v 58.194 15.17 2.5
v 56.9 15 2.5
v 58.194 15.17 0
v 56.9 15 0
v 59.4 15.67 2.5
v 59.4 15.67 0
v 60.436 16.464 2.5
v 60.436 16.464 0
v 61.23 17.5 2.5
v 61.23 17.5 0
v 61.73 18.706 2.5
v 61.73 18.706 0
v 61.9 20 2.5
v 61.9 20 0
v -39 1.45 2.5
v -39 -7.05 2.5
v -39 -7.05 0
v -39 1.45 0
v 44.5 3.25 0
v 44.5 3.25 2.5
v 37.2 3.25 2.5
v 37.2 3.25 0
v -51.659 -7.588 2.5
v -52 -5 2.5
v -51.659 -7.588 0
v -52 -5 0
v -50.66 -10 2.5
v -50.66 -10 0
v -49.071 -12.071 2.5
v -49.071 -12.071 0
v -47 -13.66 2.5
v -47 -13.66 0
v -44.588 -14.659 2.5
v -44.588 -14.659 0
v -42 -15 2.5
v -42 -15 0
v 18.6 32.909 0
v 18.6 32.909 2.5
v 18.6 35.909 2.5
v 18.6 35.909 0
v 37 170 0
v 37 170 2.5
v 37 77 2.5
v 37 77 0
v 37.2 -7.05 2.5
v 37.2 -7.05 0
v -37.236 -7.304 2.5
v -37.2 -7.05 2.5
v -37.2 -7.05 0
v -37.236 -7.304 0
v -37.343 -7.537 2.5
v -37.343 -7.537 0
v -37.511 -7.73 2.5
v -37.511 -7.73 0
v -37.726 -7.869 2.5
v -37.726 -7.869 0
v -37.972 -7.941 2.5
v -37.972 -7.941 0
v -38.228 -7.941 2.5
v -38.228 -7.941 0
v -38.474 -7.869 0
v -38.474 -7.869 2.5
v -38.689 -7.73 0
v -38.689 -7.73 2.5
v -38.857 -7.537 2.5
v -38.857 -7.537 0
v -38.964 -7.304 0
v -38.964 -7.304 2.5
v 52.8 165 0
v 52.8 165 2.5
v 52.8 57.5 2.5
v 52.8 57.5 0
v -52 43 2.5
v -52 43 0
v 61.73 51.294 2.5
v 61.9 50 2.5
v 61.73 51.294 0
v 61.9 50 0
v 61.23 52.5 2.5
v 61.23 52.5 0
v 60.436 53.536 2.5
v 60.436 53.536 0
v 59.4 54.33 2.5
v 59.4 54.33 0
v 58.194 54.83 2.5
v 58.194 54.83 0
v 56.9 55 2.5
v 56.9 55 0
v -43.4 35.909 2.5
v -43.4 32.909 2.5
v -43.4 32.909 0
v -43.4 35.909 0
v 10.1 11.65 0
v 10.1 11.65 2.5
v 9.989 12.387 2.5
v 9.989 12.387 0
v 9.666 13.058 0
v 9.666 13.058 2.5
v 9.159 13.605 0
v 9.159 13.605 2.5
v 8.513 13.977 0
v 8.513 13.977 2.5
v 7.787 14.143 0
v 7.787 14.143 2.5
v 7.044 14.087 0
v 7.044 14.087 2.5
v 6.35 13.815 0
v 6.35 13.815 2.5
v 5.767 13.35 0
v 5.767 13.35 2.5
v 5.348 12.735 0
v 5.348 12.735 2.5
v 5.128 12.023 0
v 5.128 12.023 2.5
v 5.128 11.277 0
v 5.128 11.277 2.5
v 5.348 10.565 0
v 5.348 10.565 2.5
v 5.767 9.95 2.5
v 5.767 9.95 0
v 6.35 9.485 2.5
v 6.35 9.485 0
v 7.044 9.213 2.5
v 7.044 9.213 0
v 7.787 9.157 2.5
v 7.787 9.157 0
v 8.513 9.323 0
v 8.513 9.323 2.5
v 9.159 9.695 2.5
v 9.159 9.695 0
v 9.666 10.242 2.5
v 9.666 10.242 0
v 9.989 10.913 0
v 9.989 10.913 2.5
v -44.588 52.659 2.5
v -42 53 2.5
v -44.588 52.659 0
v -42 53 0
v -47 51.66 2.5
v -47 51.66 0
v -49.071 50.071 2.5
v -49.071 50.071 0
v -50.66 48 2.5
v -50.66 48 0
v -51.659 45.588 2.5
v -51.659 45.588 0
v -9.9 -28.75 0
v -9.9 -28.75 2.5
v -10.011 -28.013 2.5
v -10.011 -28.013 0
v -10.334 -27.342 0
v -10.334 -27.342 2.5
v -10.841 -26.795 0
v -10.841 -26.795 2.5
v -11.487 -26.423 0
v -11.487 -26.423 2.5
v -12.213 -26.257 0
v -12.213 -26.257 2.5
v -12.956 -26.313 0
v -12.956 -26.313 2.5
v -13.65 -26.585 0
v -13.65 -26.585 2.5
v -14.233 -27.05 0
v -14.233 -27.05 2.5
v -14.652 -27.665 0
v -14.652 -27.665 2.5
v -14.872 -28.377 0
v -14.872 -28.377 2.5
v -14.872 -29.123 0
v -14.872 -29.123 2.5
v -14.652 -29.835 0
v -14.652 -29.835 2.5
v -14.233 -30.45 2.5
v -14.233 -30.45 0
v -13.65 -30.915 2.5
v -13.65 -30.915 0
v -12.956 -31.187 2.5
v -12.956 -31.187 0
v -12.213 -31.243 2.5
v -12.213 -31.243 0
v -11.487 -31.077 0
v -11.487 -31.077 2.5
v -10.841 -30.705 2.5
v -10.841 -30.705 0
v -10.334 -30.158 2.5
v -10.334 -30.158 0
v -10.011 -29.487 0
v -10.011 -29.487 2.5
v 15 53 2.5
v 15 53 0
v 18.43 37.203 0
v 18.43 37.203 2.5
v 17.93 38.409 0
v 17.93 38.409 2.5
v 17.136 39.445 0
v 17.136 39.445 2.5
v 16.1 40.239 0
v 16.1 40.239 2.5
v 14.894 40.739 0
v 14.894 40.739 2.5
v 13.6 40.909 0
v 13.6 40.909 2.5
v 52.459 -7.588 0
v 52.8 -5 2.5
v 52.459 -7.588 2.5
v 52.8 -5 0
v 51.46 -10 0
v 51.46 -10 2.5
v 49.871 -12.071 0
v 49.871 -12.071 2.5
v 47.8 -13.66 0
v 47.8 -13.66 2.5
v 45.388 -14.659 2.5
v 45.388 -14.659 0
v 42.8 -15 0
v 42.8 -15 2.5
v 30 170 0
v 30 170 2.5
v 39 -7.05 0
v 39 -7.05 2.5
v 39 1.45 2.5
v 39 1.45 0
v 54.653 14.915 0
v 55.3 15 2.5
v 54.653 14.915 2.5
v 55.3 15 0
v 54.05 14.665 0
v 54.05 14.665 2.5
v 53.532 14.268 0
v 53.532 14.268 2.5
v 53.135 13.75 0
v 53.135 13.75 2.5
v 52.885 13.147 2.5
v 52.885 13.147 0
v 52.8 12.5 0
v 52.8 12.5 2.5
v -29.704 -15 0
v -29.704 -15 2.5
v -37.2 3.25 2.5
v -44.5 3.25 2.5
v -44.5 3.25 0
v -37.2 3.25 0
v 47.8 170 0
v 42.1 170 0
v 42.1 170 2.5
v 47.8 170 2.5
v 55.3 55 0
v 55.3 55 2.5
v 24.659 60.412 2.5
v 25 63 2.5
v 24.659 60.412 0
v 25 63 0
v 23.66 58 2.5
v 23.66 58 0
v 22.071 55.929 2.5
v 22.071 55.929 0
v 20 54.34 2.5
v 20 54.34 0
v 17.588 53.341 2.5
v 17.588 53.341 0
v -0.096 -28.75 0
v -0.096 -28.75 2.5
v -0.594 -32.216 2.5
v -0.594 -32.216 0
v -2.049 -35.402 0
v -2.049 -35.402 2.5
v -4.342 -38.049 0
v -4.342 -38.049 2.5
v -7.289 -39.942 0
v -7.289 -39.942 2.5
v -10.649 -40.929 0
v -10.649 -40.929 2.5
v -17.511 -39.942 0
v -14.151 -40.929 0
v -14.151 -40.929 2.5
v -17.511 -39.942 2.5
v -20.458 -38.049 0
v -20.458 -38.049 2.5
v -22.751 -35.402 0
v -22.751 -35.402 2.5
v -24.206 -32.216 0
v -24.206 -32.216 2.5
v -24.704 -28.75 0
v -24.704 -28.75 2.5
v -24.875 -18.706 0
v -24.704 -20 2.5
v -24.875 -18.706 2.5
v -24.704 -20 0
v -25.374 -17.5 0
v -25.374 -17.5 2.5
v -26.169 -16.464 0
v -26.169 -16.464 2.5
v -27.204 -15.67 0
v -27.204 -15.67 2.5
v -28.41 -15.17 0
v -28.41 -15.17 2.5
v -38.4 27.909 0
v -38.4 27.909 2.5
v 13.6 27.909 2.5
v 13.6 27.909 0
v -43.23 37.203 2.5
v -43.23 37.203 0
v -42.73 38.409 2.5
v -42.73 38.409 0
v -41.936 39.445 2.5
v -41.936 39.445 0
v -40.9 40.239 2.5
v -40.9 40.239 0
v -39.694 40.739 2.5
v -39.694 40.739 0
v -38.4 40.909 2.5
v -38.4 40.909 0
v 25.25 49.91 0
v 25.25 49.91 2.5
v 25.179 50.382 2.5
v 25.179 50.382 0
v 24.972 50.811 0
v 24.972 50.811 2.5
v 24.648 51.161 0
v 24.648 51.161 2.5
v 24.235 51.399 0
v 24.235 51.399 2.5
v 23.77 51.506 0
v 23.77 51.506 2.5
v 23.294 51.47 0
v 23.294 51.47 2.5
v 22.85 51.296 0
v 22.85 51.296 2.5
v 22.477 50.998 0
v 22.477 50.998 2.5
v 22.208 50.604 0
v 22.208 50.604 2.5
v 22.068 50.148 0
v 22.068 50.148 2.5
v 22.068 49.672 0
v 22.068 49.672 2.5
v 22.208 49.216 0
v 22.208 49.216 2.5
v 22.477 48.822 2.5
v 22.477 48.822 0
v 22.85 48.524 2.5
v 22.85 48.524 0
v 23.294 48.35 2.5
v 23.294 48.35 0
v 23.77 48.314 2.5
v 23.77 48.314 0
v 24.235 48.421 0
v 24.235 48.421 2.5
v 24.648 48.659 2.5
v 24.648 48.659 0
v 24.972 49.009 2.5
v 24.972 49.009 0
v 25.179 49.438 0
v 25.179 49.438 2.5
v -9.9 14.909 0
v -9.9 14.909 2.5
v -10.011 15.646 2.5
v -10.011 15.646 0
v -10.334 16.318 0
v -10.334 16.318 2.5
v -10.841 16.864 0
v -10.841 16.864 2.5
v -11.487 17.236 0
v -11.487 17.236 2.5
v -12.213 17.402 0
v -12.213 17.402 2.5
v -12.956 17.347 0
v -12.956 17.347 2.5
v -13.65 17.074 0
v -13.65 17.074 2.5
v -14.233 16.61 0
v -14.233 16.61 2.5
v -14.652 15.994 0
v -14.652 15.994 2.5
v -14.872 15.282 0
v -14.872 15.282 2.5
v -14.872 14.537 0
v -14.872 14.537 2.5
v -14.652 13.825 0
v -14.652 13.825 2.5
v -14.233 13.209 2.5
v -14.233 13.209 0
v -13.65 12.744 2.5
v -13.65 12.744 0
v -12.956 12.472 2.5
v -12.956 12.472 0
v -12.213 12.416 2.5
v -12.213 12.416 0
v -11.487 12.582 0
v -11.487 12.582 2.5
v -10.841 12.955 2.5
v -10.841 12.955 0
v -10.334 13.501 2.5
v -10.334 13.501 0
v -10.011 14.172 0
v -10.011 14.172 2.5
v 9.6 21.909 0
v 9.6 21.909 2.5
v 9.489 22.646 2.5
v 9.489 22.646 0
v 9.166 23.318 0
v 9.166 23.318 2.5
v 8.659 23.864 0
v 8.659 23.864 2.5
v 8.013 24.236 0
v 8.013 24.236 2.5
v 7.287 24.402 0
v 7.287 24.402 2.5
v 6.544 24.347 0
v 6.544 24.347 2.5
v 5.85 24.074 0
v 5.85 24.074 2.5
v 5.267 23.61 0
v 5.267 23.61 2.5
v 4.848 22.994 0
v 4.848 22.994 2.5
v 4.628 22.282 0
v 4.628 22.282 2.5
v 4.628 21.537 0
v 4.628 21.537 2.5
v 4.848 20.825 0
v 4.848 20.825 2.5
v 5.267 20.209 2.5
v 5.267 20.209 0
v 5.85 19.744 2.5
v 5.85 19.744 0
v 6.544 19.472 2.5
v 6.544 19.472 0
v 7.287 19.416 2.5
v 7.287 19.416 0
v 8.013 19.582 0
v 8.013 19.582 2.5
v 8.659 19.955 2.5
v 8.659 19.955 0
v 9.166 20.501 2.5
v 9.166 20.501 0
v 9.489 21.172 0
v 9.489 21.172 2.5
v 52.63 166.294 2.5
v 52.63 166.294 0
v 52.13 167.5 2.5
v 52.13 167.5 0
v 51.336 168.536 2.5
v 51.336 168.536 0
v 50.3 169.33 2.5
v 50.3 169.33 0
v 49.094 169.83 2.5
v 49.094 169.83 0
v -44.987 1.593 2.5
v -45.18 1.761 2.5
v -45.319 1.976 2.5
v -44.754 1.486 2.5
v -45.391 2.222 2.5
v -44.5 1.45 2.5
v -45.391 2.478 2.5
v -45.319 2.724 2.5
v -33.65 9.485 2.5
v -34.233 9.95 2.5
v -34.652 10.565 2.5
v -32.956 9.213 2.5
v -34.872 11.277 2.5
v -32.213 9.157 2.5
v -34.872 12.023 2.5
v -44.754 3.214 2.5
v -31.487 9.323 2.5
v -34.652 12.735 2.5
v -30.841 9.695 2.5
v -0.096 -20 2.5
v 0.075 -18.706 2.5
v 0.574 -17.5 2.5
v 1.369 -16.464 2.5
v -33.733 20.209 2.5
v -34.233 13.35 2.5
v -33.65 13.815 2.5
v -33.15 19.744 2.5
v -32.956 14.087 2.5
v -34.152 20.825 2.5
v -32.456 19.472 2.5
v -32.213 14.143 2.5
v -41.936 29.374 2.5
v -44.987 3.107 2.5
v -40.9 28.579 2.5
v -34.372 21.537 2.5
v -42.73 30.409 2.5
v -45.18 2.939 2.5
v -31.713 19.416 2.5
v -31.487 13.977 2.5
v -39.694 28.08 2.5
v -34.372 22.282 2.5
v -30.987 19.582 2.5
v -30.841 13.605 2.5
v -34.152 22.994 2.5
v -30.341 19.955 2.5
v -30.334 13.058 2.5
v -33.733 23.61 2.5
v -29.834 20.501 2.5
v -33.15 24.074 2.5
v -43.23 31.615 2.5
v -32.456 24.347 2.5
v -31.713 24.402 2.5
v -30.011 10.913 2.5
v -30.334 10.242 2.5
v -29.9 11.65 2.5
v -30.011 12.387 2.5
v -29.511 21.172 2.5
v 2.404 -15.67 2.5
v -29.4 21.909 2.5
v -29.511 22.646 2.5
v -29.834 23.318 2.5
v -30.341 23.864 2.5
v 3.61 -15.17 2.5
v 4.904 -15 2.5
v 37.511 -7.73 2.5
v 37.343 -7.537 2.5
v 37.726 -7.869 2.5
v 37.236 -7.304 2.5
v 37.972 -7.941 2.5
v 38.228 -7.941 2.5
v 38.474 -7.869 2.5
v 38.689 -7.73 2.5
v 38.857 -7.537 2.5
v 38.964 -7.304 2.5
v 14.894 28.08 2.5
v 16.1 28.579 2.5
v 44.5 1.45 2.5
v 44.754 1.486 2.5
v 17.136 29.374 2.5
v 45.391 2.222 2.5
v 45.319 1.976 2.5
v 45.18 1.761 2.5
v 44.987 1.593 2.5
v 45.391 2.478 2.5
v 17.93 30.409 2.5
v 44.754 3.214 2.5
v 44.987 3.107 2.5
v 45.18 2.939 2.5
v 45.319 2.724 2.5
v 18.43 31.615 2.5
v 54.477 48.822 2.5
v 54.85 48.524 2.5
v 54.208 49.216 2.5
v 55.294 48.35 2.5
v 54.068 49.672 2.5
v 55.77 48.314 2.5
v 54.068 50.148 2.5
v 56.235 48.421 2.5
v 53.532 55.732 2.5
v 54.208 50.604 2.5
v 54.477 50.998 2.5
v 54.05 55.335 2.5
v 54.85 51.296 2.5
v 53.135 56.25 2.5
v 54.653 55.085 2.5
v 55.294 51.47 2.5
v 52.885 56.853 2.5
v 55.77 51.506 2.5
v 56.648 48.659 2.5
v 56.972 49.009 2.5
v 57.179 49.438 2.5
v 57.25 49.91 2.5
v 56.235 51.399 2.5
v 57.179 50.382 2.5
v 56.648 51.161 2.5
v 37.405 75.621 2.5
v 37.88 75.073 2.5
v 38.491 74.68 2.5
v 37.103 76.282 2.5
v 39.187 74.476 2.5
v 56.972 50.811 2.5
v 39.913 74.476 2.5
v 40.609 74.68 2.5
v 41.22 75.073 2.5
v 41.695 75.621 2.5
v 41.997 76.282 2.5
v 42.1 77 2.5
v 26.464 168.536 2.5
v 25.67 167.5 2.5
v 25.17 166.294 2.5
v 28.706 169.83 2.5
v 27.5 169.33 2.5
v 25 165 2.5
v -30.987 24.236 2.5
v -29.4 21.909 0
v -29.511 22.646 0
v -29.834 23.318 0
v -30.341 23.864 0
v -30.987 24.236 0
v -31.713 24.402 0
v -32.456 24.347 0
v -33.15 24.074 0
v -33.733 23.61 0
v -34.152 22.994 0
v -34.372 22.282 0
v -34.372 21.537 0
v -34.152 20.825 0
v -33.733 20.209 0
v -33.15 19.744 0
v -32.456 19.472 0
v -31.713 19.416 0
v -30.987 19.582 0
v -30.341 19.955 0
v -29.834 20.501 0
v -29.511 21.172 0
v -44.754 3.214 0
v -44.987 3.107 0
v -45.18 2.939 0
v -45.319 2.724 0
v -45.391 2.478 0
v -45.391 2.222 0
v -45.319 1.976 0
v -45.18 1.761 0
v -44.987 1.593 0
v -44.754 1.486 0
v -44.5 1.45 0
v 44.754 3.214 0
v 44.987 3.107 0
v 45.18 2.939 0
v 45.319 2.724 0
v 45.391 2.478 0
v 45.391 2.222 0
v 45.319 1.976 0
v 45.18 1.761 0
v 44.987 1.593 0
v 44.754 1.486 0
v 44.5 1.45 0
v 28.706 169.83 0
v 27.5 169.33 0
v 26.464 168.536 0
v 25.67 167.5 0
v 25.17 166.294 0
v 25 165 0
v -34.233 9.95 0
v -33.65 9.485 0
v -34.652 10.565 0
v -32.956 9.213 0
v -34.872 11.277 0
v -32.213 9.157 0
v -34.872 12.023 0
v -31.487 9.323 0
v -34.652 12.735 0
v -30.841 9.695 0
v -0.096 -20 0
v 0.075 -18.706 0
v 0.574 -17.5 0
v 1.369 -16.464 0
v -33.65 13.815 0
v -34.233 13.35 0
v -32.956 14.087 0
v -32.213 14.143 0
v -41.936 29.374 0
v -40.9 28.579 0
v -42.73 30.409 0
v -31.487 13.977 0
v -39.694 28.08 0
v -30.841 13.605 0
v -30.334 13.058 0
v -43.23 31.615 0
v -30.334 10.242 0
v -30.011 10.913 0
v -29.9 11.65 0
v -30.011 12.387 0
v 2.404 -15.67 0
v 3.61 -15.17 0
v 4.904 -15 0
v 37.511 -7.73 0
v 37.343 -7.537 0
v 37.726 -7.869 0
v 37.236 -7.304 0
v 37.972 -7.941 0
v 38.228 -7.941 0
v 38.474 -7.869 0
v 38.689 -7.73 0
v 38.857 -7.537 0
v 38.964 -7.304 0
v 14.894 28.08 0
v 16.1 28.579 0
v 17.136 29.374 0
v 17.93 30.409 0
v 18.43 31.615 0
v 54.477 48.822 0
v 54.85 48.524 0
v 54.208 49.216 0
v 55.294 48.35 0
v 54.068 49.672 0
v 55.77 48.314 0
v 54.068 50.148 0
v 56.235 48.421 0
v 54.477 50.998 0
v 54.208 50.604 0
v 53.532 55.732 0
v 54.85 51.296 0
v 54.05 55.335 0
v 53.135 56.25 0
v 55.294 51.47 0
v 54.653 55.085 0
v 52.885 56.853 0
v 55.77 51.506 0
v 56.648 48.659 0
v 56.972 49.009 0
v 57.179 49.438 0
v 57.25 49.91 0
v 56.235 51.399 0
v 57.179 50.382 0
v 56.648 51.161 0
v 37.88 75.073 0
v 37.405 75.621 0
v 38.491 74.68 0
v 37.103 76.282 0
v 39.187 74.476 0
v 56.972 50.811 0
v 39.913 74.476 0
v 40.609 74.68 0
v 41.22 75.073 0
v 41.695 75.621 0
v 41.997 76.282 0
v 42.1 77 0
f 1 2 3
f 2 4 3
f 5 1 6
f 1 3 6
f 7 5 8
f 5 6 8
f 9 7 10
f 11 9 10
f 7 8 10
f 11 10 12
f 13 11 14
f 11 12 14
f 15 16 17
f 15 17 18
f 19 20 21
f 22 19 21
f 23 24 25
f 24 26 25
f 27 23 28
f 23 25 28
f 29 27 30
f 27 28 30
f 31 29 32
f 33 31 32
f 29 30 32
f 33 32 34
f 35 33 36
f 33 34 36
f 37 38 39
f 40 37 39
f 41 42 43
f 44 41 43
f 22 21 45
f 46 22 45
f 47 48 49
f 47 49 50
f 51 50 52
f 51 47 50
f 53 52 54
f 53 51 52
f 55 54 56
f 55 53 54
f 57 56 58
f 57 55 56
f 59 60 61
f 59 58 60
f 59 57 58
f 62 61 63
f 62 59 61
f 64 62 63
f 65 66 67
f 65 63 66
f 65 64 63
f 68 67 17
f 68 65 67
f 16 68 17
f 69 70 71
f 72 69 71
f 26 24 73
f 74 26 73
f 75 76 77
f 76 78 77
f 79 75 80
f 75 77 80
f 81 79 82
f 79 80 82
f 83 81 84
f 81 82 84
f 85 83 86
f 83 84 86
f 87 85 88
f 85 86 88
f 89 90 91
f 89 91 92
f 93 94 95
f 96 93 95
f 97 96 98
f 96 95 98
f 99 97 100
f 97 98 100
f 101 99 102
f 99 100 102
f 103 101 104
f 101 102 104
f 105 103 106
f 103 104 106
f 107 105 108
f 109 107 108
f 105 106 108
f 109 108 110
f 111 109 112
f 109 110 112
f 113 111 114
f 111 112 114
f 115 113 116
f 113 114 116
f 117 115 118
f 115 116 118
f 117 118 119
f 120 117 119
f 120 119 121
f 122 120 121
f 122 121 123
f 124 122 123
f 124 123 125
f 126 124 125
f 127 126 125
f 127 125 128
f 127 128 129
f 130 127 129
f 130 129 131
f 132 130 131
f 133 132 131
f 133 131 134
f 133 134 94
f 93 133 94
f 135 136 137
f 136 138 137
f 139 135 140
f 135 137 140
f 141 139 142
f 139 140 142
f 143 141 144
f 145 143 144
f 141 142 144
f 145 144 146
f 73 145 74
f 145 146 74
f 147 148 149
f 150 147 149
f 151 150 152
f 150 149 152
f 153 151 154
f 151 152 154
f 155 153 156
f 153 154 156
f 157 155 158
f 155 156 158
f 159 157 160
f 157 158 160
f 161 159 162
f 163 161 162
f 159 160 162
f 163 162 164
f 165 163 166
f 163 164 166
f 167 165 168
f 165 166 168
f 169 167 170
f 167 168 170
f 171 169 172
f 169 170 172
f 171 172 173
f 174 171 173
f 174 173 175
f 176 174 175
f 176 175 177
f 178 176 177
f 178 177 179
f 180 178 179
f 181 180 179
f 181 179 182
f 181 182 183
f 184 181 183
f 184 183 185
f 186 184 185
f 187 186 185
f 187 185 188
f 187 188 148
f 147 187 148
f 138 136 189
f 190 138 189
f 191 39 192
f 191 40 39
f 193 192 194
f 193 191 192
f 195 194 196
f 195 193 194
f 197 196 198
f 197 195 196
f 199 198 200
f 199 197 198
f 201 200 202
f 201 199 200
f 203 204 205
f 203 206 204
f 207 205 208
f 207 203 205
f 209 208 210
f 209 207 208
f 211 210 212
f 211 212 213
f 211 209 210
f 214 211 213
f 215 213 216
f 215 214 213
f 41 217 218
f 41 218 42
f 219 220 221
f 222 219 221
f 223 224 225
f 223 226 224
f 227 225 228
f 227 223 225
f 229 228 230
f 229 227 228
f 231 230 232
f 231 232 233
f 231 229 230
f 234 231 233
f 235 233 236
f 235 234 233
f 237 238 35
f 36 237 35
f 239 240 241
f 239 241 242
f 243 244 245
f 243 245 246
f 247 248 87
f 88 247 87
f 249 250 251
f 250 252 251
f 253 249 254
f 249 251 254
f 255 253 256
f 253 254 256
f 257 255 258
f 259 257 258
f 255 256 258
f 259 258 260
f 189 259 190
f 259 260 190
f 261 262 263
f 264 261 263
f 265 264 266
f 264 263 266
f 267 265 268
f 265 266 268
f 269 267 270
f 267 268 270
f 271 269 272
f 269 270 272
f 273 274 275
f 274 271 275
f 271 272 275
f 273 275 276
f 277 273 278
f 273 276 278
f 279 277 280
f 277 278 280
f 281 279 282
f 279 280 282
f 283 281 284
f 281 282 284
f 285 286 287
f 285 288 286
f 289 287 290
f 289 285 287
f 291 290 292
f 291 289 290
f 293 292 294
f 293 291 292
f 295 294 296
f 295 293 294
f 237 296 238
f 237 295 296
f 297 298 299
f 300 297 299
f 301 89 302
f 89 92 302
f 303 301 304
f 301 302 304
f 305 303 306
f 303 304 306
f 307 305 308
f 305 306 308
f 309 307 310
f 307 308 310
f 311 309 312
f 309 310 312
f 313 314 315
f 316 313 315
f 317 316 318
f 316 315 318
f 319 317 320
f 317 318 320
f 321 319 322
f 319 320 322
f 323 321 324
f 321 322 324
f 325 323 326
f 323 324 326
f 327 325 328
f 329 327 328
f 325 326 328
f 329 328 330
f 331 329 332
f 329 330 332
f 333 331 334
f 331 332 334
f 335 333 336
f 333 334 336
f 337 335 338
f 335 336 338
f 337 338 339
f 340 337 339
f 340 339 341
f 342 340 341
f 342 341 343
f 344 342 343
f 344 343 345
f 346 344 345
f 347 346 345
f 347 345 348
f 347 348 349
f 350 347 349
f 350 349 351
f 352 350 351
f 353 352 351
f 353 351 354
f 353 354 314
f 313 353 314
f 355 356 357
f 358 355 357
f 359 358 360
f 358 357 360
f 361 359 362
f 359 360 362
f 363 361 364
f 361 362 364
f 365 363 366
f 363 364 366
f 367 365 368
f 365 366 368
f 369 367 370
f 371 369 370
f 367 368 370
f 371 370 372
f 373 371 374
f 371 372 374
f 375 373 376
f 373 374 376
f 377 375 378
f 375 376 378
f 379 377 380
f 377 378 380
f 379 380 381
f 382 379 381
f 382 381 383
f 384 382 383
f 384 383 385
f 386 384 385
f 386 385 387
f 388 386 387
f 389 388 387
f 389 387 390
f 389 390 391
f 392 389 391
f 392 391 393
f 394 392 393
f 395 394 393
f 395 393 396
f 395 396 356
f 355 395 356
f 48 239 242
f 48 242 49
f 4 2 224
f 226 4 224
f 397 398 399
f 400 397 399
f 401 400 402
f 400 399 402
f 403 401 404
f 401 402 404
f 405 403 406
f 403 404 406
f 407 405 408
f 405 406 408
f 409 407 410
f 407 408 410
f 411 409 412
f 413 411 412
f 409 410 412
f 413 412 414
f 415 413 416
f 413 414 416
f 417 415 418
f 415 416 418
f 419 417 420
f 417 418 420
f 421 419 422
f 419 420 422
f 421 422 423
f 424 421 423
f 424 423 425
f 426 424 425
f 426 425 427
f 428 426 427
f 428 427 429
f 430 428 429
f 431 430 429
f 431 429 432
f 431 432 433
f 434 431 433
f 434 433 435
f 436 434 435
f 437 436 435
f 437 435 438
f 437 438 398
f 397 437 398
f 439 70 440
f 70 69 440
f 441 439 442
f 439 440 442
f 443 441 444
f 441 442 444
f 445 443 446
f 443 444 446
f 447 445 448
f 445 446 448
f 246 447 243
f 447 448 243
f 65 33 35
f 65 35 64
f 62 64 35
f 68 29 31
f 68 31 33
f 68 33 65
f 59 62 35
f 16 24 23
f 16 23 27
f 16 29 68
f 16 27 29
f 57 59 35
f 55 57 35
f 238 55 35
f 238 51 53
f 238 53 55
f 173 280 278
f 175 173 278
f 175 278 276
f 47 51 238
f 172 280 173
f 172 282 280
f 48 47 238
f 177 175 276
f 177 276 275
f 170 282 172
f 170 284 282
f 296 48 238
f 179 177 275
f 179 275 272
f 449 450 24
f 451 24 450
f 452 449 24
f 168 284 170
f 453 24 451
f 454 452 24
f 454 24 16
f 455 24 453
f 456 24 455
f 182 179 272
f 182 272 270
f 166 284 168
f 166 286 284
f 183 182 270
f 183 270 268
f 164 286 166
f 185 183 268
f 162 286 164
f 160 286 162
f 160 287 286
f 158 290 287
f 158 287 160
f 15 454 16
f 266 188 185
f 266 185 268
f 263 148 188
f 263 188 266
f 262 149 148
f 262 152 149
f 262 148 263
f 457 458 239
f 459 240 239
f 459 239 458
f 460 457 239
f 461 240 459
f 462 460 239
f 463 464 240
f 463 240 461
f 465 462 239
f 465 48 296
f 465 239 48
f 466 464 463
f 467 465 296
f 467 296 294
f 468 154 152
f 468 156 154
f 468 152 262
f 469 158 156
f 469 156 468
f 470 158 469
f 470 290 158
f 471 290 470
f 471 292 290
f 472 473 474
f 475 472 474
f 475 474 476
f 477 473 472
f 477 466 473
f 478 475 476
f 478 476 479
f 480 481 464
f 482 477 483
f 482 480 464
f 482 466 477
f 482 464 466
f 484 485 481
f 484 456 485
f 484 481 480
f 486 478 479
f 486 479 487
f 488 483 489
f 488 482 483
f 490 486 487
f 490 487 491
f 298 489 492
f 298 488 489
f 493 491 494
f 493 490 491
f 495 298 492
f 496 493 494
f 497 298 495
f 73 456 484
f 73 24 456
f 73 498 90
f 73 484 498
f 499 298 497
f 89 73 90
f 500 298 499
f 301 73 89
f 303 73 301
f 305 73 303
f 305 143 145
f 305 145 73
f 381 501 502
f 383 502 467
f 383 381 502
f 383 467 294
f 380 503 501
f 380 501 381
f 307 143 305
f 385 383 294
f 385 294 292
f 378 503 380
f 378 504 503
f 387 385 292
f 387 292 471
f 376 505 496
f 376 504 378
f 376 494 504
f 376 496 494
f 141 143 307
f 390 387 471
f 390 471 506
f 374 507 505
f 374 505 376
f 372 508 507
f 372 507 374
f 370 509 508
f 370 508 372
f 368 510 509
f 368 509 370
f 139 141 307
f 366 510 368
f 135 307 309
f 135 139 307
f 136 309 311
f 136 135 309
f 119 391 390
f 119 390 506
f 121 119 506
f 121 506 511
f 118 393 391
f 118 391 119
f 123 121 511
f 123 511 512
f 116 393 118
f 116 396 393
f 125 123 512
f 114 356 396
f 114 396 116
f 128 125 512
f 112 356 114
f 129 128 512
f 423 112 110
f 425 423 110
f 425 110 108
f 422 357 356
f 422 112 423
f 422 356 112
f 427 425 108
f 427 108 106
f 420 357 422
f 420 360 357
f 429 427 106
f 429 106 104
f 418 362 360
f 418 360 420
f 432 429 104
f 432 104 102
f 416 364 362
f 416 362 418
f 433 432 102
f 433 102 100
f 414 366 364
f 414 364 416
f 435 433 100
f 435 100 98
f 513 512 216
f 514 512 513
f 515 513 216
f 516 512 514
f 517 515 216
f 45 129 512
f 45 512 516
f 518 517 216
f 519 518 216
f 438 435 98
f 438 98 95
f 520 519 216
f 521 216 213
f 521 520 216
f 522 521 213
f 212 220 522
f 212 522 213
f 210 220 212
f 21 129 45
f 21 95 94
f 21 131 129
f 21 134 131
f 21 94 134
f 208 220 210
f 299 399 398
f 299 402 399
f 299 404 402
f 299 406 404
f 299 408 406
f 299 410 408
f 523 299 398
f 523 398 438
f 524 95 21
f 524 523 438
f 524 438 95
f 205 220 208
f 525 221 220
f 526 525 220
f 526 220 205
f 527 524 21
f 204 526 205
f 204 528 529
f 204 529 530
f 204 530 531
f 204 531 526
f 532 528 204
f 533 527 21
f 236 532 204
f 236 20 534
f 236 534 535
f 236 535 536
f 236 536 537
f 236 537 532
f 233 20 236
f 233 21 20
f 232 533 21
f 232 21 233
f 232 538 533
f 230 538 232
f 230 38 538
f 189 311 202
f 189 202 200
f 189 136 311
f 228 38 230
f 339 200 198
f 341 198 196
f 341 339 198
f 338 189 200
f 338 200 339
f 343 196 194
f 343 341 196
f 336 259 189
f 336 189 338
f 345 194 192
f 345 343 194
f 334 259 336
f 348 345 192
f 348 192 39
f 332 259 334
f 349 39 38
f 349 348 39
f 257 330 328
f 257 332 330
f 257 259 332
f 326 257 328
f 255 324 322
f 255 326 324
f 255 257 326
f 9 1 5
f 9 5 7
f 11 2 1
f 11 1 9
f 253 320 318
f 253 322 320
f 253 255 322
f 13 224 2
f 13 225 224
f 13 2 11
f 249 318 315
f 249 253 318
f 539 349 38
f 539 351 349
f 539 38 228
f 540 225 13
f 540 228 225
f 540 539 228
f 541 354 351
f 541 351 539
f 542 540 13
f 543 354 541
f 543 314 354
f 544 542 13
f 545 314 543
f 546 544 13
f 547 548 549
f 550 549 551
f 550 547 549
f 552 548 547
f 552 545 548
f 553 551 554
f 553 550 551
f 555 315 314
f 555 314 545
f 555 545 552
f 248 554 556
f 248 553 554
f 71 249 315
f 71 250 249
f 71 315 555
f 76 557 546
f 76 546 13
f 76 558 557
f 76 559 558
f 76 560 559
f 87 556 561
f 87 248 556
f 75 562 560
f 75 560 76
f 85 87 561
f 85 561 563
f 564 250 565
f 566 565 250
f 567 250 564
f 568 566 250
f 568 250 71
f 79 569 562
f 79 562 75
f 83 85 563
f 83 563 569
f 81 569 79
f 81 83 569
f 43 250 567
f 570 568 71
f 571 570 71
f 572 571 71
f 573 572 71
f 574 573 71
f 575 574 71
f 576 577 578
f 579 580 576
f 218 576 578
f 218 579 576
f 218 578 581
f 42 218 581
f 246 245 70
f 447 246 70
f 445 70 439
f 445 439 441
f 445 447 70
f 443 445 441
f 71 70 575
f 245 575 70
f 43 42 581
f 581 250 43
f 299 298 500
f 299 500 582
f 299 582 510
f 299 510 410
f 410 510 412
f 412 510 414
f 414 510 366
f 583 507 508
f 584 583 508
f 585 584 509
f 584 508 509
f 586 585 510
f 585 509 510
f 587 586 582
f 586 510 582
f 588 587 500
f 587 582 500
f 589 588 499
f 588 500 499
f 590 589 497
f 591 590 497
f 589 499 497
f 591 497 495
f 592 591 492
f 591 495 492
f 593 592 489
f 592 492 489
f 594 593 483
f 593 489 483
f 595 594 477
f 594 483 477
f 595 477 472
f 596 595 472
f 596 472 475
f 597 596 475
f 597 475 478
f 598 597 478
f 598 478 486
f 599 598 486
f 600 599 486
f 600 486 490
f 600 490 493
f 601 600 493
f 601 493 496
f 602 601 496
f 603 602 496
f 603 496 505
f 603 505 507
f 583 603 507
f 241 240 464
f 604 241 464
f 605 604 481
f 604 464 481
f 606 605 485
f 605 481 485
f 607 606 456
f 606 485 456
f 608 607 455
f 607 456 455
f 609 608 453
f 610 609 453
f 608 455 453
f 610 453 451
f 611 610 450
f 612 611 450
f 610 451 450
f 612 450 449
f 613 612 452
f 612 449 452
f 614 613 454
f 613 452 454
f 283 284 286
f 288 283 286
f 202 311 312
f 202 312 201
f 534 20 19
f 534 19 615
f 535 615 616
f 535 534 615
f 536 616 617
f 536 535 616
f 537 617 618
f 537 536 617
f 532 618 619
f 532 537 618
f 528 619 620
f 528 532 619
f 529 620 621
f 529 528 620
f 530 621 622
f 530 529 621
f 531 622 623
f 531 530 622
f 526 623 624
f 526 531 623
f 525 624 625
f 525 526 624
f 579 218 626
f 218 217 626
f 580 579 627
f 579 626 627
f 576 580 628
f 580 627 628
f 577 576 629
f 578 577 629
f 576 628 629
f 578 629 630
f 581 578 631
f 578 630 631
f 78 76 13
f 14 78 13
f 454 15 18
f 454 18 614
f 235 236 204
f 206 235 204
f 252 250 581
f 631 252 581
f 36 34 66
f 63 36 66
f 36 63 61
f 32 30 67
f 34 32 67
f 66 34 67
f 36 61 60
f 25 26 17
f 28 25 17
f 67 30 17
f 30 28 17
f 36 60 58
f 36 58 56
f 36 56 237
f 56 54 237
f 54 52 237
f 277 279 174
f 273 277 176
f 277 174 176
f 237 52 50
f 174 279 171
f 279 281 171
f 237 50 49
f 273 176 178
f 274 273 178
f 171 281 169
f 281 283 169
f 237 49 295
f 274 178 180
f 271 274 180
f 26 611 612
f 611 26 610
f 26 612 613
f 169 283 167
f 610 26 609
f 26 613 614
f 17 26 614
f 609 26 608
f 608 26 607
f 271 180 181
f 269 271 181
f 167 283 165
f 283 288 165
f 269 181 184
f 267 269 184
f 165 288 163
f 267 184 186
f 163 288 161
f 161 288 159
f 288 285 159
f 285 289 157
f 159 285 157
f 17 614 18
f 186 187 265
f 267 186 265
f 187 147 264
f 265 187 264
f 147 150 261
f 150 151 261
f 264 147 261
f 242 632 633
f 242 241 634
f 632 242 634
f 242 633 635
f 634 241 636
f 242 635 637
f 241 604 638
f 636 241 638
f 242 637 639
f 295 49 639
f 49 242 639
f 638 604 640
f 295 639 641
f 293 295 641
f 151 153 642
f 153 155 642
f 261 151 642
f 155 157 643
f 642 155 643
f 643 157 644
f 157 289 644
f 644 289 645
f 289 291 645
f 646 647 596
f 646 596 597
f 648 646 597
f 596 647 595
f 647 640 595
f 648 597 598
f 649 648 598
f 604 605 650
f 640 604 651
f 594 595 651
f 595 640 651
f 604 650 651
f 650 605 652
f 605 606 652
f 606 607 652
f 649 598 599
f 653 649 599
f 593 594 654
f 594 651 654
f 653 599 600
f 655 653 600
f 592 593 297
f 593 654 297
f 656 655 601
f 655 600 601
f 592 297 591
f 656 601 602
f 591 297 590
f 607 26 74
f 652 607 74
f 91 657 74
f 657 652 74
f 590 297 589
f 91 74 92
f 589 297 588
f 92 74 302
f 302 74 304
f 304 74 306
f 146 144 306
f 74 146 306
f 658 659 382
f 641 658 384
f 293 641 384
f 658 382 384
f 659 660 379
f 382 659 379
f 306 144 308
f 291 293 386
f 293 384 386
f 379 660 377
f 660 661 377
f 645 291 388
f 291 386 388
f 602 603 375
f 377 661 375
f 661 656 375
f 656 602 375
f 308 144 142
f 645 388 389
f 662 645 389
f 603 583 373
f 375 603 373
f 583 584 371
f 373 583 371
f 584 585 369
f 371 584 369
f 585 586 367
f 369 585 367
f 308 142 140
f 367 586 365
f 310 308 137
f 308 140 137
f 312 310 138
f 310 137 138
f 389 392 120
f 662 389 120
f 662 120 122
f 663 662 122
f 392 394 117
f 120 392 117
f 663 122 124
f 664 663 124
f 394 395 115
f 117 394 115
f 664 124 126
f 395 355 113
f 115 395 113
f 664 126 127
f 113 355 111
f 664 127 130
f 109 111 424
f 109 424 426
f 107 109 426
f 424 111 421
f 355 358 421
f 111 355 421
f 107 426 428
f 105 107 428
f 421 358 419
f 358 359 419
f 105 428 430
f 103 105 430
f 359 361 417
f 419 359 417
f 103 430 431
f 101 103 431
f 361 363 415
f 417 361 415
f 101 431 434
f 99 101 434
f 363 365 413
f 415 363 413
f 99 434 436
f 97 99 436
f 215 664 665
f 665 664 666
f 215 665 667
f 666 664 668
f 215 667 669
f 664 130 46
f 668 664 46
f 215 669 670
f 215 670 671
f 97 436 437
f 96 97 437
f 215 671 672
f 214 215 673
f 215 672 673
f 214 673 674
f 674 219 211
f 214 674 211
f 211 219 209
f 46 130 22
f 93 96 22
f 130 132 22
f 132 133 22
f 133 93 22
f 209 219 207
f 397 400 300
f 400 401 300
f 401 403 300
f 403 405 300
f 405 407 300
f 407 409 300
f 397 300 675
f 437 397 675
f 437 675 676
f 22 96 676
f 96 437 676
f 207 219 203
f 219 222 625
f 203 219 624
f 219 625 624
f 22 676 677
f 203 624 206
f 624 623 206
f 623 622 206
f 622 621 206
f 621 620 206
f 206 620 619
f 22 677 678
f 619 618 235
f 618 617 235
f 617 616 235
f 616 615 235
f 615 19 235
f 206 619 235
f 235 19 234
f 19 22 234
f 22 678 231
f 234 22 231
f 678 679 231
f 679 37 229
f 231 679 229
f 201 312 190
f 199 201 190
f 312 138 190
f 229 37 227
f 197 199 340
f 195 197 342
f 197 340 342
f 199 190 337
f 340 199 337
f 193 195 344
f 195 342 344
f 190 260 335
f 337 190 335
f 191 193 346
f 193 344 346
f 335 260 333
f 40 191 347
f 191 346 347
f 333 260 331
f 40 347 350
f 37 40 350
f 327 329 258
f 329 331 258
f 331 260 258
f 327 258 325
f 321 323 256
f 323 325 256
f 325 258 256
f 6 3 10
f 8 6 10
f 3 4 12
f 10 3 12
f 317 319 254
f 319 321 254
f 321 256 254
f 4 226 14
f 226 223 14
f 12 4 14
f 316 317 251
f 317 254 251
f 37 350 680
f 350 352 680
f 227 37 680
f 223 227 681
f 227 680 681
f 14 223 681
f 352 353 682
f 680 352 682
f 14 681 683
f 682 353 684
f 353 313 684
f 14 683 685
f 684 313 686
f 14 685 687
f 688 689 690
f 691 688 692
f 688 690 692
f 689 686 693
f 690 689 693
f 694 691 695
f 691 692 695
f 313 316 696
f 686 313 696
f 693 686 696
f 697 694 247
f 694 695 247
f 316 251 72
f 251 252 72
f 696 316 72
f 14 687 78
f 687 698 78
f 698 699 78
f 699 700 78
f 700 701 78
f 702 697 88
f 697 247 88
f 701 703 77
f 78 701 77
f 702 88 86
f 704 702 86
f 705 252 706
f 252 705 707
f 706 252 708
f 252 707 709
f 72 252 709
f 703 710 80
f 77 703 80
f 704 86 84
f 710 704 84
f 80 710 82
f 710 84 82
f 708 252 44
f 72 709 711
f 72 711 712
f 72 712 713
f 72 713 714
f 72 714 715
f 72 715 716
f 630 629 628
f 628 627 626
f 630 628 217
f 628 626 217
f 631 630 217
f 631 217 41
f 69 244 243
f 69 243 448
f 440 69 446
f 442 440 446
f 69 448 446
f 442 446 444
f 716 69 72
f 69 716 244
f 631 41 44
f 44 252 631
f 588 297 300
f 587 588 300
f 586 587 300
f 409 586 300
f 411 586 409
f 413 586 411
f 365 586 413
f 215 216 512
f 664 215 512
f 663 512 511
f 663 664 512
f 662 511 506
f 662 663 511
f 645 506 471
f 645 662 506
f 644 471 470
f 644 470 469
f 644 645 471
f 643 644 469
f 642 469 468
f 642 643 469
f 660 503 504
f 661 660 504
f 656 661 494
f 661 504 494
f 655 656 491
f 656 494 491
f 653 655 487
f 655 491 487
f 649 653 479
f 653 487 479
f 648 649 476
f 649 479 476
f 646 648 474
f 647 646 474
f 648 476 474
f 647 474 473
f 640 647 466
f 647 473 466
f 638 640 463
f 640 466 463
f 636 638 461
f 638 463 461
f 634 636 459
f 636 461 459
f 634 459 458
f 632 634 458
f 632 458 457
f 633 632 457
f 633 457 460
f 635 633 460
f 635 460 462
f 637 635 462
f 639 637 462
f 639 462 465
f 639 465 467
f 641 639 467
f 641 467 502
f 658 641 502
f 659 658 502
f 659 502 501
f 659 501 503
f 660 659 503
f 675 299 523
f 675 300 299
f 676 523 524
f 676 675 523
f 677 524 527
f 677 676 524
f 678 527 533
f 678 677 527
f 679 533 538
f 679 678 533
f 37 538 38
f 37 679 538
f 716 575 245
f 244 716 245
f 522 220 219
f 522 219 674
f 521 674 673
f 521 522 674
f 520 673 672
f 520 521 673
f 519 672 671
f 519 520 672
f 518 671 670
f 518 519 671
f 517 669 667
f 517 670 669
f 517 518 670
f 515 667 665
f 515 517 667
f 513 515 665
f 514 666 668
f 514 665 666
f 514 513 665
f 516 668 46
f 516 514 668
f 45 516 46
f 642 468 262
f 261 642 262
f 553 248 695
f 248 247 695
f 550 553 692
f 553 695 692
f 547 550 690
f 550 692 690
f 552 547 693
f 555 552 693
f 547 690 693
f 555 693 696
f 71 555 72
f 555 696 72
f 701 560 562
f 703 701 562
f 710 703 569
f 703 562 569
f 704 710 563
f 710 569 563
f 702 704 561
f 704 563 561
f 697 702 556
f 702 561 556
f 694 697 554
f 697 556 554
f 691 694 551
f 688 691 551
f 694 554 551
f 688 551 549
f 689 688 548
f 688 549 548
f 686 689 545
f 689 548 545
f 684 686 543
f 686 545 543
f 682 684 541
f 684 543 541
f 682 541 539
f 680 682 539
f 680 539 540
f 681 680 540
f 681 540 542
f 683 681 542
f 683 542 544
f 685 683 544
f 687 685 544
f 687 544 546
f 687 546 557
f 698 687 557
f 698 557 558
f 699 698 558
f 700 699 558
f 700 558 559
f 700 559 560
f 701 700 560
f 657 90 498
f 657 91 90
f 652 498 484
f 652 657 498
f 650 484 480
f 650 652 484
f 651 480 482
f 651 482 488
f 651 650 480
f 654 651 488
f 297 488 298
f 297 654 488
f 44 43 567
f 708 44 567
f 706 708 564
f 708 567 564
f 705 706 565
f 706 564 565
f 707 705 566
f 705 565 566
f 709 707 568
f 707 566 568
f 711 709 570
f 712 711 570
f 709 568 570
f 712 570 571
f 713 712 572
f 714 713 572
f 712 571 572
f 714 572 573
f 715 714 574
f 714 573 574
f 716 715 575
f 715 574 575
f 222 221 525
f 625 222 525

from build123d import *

# Parameters (mm, degrees)
SKETCH1_W           = 200
SKETCH1_H           = 300
SKETCH1_W_2         = 96.214780988
SKETCH1_H_2         = 20
BOSS_EXTRUDE1_DEPTH = 2.5
SKETCH2_R           = 2.5
CUT_EXTRUDE1_DEPTH  = 10
CUT_EXTRUDE3_DEPTH  = 10
CUT_EXTRUDE4_REACH  = 182.936
SKETCH5_W           = 62
SKETCH5_H           = 13
FILLET2_R           = 5
FILLET3_R           = 10
FILLET4_R           = 5
CUT_EXTRUDE6_REACH  = 182.936
SKETCH7_R           = 1.6
FILLET5_R           = 2.5
CUT_EXTRUDE7_REACH  = 182.936
SKETCH8_R           = 2.5


with BuildPart() as part:
    # Sketch1 → Boss-Extrude1 (new body)
    with BuildSketch(Plane.XY):
        Rectangle(SKETCH1_W, SKETCH1_H)
        with Locations((51.892609506, 160)):
            Rectangle(SKETCH1_W_2, SKETCH1_H_2)
    extrude(amount=BOSS_EXTRUDE1_DEPTH)

    # Sketch2 → Cut-Extrude1 (cut)
    with BuildSketch(Plane.XY.offset(2.5)):
        with Locations((-12.4, -28.75)):
            Circle(SKETCH2_R)
        with Locations((7.6, 11.65)):
            Circle(SKETCH2_R)
        with Locations((-32.4, 11.65)):
            Circle(SKETCH2_R)
        Polygon((-44.5, 1.45), (-44.5, 3.25), (-37.2, 3.25), (-37.2, -7.05), (-39, -7.05), (-39, 1.45), align=None)
        Polygon((39, 1.45), (44.5, 1.45), (44.5, 3.25), (37.2, 3.25), (37.2, -7.05), (39, -7.05), align=None)
        with BuildLine():
            Line((-44.5, 1.45), (-44.5, 3.25))
            ThreePointArc((-44.5, 3.25), (-45.4, 2.35), (-44.5, 1.45))
        make_face()
        with BuildLine():
            ThreePointArc((-37.2, -7.05), (-38.1, -7.95), (-39, -7.05))
            Line((-39, -7.05), (-37.2, -7.05))
        make_face()
        with BuildLine():
            ThreePointArc((39, -7.05), (38.1, -7.95), (37.2, -7.05))
            Line((37.2, -7.05), (39, -7.05))
        make_face()
        with BuildLine():
            ThreePointArc((44.5, 3.25), (45.4, 2.35), (44.5, 1.45))
            Line((44.5, 1.45), (44.5, 3.25))
        make_face()
    extrude(amount=-CUT_EXTRUDE1_DEPTH, mode=Mode.SUBTRACT)

    # Sketch4 → Cut-Extrude3 (cut)
    with BuildSketch(Plane.XY.offset(2.5)):
        with BuildLine():
            Line((42.1, 170), (37, 170))
            Line((37, 170), (37, 77))
            ThreePointArc((37, 77), (39.55, 74.45), (42.1, 77))
            Line((42.1, 77), (42.1, 170))
        make_face()
        with BuildLine():
            Line((25, 53), (25, 170))
            Line((25, 170), (3.785219012, 170))
            Line((3.785219012, 170), (3.785219012, 150))
            Line((3.785219012, 150), (-100, 150))
            Line((-100, 150), (-100, -150))
            Line((-100, -150), (100, -150))
            Line((100, -150), (100, 170))
            Line((100, 170), (52.8, 170))
            Line((52.8, 170), (52.8, 55))
            Line((52.8, 55), (61.9, 55))
            Line((61.9, 55), (61.9, 15))
            Line((61.9, 15), (52.8, 15))
            Line((52.8, 15), (52.8, -15))
            Line((52.8, -15), (-0.095794877, -15))
            Line((-0.095794877, -15), (-0.095794877, -28.75))
            ThreePointArc((-0.095794877, -28.75), (-12.4, -41.054205123), (-24.704205123, -28.75))
            Line((-24.704205123, -28.75), (-24.704205123, -15))
            Line((-24.704205123, -15), (-52, -15))
            Line((-52, -15), (-52, 53))
            Line((-52, 53), (25, 53))
        make_face()
    extrude(amount=-CUT_EXTRUDE3_DEPTH, mode=Mode.SUBTRACT)

    # Sketch5 → Cut-Extrude4 (cut, up to next)
    with BuildSketch(Plane.XY.offset(2.5), mode=Mode.PRIVATE) as cut_extrude4_sk1:
        with Locations((-12.4, 34.409289568)):
            Rectangle(SKETCH5_W, SKETCH5_H)
    cut_extrude4_tool1 = extrude(cut_extrude4_sk1.sketch, amount=-CUT_EXTRUDE4_REACH, mode=Mode.PRIVATE) & part.part
    add(cut_extrude4_tool1.solids().sort_by_distance((-12.4, 34.40929, 2.5))[0], mode=Mode.SUBTRACT)

    # Fillet2
    fillet2_edges = [part.edges().sort_by_distance(p)[0] for p in [
        (-43.4, 40.909289568, 1.25),
        (18.6, 40.909289568, 1.25),
        (18.6, 27.909289568, 1.25),
        (-43.4, 27.909289568, 1.25),
    ]]
    fillet(fillet2_edges, radius=FILLET2_R)

    # Fillet3
    fillet3_edges = [part.edges().sort_by_distance(p)[0] for p in [
        (52.8, -15, 1.25),
        (25, 53, 1.25),
        (-52, 53, 1.25),
        (-52, -15, 1.25),
    ]]
    fillet(fillet3_edges, radius=FILLET3_R)

    # Fillet4
    fillet4_edges = [part.edges().sort_by_distance(p)[0] for p in [
        (-0.095794877, -15, 1.25),
        (61.9, 15, 1.25),
        (61.9, 55, 1.25),
        (-24.704205123, -15, 1.25),
        (25, 170, 1.25),
        (52.8, 170, 1.25),
    ]]
    fillet(fillet4_edges, radius=FILLET4_R)

    # Sketch7 → Cut-Extrude6 (cut, up to next)
    with BuildSketch(Plane.XY.offset(2.5), mode=Mode.PRIVATE) as cut_extrude6_sk1:
        with Locations((55.65, 49.91)):
            Circle(SKETCH7_R)
    cut_extrude6_tool1 = extrude(cut_extrude6_sk1.sketch, amount=-CUT_EXTRUDE6_REACH, mode=Mode.PRIVATE) & part.part
    # Sketch7 → Cut-Extrude6 (cut, up to next)
    with BuildSketch(Plane.XY.offset(2.5), mode=Mode.PRIVATE) as cut_extrude6_sk2:
        with Locations((23.65, 49.91)):
            Circle(SKETCH7_R)
    cut_extrude6_tool2 = extrude(cut_extrude6_sk2.sketch, amount=-CUT_EXTRUDE6_REACH, mode=Mode.PRIVATE) & part.part
    add(cut_extrude6_tool1.solids().sort_by_distance((55.65, 49.91, 2.5))[0], mode=Mode.SUBTRACT)
    add(cut_extrude6_tool2.solids().sort_by_distance((23.65, 49.91, 2.5))[0], mode=Mode.SUBTRACT)

    # Fillet5
    fillet5_edges = [part.edges().sort_by_distance(p)[0] for p in [
        (52.8, 15, 1.25),
        (52.8, 55, 1.25),
    ]]
    fillet(fillet5_edges, radius=FILLET5_R)

    # Sketch8 → Cut-Extrude7 (cut, up to next)
    with BuildSketch(Plane.XY.offset(2.5), mode=Mode.PRIVATE) as cut_extrude7_sk1:
        with Locations((7.1, 21.909289568)):
            Circle(SKETCH8_R)
    cut_extrude7_tool1 = extrude(cut_extrude7_sk1.sketch, amount=-CUT_EXTRUDE7_REACH, mode=Mode.PRIVATE) & part.part
    # Sketch8 → Cut-Extrude7 (cut, up to next)
    with BuildSketch(Plane.XY.offset(2.5), mode=Mode.PRIVATE) as cut_extrude7_sk2:
        with Locations((-31.9, 21.909289568)):
            Circle(SKETCH8_R)
    cut_extrude7_tool2 = extrude(cut_extrude7_sk2.sketch, amount=-CUT_EXTRUDE7_REACH, mode=Mode.PRIVATE) & part.part
    # Sketch8 → Cut-Extrude7 (cut, up to next)
    with BuildSketch(Plane.XY.offset(2.5), mode=Mode.PRIVATE) as cut_extrude7_sk3:
        with Locations((-12.4, 14.909289568)):
            Circle(SKETCH8_R)
    cut_extrude7_tool3 = extrude(cut_extrude7_sk3.sketch, amount=-CUT_EXTRUDE7_REACH, mode=Mode.PRIVATE) & part.part
    add(cut_extrude7_tool1.solids().sort_by_distance((7.1, 21.90929, 2.5))[0], mode=Mode.SUBTRACT)
    add(cut_extrude7_tool2.solids().sort_by_distance((-31.9, 21.90929, 2.5))[0], mode=Mode.SUBTRACT)
    add(cut_extrude7_tool3.solids().sort_by_distance((-12.4, 14.90929, 2.5))[0], mode=Mode.SUBTRACT)


solid = part.part
